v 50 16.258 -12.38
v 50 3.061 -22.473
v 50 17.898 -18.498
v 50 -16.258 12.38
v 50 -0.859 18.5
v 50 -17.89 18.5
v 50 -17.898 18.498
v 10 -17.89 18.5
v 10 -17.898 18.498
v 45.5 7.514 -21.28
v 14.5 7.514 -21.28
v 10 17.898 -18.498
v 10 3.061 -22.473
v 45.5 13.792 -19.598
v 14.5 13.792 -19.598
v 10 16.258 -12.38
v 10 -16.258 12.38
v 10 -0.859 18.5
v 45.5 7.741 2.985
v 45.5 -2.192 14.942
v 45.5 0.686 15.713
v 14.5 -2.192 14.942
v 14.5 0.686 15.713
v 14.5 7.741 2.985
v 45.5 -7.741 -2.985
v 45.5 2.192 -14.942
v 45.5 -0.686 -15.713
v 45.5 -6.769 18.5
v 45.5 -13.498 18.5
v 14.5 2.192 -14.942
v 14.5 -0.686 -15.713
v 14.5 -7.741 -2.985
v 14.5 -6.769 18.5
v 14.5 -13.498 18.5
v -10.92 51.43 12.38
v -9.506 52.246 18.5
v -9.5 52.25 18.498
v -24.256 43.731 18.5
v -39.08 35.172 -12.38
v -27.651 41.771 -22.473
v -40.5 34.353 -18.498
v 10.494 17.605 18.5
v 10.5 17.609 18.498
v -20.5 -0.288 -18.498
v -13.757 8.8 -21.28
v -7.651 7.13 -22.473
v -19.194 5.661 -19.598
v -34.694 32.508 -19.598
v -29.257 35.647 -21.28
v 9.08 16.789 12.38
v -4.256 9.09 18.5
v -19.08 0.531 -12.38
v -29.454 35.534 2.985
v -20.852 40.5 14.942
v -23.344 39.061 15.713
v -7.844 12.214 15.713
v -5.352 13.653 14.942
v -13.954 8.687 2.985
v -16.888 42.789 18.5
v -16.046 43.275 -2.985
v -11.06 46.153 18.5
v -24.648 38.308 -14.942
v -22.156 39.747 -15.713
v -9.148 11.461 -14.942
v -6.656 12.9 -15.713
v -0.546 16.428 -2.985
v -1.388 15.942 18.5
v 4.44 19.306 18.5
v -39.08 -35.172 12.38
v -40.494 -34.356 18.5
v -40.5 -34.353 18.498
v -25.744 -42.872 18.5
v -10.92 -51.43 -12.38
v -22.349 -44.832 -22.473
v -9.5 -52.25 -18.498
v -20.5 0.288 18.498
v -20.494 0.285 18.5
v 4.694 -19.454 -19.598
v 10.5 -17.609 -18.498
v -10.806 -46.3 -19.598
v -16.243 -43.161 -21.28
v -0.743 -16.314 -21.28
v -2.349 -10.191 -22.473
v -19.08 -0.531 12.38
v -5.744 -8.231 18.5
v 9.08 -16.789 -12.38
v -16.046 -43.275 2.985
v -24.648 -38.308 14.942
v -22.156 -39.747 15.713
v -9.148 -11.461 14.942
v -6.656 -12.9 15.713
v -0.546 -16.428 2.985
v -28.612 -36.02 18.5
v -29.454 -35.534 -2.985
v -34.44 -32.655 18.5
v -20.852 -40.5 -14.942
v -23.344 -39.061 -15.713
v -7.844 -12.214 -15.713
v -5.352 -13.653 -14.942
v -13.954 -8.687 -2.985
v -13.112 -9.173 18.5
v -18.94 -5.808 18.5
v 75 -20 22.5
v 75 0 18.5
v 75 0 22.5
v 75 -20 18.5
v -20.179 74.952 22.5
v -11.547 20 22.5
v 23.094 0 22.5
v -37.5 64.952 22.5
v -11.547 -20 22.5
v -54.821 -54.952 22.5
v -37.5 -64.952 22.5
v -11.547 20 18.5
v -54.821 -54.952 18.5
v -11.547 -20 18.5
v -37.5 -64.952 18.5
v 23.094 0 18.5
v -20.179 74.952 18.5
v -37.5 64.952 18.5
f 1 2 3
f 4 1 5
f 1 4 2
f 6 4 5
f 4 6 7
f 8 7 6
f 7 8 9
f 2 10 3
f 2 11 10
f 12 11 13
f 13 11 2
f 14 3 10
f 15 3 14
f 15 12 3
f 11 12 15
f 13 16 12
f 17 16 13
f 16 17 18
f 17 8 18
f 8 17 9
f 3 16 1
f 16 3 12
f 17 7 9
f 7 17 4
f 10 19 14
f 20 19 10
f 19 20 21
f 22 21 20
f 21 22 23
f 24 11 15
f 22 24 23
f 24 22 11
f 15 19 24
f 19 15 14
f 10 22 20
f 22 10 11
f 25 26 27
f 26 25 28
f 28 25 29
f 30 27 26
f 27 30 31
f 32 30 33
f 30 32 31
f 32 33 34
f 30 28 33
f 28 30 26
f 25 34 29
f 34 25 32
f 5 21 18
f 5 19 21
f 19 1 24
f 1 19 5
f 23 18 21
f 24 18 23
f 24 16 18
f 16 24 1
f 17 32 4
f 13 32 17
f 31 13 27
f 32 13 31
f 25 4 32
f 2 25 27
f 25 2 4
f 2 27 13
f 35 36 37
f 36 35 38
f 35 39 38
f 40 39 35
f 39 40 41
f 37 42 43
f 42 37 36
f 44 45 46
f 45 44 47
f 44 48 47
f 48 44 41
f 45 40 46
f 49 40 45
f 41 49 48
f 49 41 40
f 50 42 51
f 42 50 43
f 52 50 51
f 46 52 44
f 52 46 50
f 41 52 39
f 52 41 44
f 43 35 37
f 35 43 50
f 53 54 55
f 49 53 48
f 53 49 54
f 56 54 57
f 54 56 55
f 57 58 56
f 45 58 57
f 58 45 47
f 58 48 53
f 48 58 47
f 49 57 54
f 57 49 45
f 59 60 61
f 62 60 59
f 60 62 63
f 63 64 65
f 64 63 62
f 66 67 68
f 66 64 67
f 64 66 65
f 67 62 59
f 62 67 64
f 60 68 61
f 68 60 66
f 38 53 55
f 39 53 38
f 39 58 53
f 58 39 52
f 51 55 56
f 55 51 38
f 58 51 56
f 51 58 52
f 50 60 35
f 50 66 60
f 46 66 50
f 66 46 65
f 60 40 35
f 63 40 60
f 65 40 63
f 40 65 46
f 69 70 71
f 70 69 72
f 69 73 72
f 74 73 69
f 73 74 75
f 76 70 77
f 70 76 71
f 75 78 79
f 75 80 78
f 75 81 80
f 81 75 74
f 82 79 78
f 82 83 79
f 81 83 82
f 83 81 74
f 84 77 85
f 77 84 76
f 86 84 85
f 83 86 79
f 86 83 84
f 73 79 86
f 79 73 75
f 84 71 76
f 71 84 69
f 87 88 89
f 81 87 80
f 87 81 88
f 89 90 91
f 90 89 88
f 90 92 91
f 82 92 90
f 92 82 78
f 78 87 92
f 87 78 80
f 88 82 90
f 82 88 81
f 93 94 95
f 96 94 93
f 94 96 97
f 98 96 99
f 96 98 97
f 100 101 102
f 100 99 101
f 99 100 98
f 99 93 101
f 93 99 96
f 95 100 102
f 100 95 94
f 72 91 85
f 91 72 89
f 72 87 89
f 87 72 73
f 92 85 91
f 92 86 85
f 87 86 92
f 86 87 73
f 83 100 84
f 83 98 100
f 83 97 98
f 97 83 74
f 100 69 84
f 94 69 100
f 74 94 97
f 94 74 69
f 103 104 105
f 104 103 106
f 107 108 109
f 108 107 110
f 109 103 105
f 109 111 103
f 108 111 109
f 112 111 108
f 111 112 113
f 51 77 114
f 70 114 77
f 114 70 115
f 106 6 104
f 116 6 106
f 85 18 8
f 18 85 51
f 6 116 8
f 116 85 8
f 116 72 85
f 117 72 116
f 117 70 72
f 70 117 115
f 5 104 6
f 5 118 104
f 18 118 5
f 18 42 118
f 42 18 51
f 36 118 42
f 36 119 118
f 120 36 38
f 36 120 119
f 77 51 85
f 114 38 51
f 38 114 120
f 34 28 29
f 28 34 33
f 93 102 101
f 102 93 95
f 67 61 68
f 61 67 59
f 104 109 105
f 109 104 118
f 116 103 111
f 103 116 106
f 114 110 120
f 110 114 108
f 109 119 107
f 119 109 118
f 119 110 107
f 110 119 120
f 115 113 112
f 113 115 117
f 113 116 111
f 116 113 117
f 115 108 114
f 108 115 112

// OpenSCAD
$fn = 100;

module joiner()
{
    difference()
    {
        cube([ 40, 25, 45 ], true);

        translate([ 0, 5, -5 ]) cube([ 31, 6.5, 40 ], true);
        translate([ 0, -5, 5 ]) cube([ 31, 6.5, 40 ], true);

        translate([ 0, 60, 0 ]) rotate([ 14, 0, 0 ]) cube([ 100, 100, 100 ], true);
        translate([ 0, -60, 0 ]) rotate([ 14, 0, 0 ]) cube([ 100, 100, 100 ], true);
    }
}

// translate([ 0, 0, 20.5 ]) cylinder(r = 60, h = 4, center = true);

for (i = [0:2])
{
    rotate([ 0, 0, i * 120 ]) translate([ 30, 0, 0 ]) rotate([ 15, 0, 0 ]) joiner();

    rotate([ 0, 0, i * 120 ]) translate([ 30, -10, 20.5 ]) cube([ 90, 20, 4 ], true);
}
